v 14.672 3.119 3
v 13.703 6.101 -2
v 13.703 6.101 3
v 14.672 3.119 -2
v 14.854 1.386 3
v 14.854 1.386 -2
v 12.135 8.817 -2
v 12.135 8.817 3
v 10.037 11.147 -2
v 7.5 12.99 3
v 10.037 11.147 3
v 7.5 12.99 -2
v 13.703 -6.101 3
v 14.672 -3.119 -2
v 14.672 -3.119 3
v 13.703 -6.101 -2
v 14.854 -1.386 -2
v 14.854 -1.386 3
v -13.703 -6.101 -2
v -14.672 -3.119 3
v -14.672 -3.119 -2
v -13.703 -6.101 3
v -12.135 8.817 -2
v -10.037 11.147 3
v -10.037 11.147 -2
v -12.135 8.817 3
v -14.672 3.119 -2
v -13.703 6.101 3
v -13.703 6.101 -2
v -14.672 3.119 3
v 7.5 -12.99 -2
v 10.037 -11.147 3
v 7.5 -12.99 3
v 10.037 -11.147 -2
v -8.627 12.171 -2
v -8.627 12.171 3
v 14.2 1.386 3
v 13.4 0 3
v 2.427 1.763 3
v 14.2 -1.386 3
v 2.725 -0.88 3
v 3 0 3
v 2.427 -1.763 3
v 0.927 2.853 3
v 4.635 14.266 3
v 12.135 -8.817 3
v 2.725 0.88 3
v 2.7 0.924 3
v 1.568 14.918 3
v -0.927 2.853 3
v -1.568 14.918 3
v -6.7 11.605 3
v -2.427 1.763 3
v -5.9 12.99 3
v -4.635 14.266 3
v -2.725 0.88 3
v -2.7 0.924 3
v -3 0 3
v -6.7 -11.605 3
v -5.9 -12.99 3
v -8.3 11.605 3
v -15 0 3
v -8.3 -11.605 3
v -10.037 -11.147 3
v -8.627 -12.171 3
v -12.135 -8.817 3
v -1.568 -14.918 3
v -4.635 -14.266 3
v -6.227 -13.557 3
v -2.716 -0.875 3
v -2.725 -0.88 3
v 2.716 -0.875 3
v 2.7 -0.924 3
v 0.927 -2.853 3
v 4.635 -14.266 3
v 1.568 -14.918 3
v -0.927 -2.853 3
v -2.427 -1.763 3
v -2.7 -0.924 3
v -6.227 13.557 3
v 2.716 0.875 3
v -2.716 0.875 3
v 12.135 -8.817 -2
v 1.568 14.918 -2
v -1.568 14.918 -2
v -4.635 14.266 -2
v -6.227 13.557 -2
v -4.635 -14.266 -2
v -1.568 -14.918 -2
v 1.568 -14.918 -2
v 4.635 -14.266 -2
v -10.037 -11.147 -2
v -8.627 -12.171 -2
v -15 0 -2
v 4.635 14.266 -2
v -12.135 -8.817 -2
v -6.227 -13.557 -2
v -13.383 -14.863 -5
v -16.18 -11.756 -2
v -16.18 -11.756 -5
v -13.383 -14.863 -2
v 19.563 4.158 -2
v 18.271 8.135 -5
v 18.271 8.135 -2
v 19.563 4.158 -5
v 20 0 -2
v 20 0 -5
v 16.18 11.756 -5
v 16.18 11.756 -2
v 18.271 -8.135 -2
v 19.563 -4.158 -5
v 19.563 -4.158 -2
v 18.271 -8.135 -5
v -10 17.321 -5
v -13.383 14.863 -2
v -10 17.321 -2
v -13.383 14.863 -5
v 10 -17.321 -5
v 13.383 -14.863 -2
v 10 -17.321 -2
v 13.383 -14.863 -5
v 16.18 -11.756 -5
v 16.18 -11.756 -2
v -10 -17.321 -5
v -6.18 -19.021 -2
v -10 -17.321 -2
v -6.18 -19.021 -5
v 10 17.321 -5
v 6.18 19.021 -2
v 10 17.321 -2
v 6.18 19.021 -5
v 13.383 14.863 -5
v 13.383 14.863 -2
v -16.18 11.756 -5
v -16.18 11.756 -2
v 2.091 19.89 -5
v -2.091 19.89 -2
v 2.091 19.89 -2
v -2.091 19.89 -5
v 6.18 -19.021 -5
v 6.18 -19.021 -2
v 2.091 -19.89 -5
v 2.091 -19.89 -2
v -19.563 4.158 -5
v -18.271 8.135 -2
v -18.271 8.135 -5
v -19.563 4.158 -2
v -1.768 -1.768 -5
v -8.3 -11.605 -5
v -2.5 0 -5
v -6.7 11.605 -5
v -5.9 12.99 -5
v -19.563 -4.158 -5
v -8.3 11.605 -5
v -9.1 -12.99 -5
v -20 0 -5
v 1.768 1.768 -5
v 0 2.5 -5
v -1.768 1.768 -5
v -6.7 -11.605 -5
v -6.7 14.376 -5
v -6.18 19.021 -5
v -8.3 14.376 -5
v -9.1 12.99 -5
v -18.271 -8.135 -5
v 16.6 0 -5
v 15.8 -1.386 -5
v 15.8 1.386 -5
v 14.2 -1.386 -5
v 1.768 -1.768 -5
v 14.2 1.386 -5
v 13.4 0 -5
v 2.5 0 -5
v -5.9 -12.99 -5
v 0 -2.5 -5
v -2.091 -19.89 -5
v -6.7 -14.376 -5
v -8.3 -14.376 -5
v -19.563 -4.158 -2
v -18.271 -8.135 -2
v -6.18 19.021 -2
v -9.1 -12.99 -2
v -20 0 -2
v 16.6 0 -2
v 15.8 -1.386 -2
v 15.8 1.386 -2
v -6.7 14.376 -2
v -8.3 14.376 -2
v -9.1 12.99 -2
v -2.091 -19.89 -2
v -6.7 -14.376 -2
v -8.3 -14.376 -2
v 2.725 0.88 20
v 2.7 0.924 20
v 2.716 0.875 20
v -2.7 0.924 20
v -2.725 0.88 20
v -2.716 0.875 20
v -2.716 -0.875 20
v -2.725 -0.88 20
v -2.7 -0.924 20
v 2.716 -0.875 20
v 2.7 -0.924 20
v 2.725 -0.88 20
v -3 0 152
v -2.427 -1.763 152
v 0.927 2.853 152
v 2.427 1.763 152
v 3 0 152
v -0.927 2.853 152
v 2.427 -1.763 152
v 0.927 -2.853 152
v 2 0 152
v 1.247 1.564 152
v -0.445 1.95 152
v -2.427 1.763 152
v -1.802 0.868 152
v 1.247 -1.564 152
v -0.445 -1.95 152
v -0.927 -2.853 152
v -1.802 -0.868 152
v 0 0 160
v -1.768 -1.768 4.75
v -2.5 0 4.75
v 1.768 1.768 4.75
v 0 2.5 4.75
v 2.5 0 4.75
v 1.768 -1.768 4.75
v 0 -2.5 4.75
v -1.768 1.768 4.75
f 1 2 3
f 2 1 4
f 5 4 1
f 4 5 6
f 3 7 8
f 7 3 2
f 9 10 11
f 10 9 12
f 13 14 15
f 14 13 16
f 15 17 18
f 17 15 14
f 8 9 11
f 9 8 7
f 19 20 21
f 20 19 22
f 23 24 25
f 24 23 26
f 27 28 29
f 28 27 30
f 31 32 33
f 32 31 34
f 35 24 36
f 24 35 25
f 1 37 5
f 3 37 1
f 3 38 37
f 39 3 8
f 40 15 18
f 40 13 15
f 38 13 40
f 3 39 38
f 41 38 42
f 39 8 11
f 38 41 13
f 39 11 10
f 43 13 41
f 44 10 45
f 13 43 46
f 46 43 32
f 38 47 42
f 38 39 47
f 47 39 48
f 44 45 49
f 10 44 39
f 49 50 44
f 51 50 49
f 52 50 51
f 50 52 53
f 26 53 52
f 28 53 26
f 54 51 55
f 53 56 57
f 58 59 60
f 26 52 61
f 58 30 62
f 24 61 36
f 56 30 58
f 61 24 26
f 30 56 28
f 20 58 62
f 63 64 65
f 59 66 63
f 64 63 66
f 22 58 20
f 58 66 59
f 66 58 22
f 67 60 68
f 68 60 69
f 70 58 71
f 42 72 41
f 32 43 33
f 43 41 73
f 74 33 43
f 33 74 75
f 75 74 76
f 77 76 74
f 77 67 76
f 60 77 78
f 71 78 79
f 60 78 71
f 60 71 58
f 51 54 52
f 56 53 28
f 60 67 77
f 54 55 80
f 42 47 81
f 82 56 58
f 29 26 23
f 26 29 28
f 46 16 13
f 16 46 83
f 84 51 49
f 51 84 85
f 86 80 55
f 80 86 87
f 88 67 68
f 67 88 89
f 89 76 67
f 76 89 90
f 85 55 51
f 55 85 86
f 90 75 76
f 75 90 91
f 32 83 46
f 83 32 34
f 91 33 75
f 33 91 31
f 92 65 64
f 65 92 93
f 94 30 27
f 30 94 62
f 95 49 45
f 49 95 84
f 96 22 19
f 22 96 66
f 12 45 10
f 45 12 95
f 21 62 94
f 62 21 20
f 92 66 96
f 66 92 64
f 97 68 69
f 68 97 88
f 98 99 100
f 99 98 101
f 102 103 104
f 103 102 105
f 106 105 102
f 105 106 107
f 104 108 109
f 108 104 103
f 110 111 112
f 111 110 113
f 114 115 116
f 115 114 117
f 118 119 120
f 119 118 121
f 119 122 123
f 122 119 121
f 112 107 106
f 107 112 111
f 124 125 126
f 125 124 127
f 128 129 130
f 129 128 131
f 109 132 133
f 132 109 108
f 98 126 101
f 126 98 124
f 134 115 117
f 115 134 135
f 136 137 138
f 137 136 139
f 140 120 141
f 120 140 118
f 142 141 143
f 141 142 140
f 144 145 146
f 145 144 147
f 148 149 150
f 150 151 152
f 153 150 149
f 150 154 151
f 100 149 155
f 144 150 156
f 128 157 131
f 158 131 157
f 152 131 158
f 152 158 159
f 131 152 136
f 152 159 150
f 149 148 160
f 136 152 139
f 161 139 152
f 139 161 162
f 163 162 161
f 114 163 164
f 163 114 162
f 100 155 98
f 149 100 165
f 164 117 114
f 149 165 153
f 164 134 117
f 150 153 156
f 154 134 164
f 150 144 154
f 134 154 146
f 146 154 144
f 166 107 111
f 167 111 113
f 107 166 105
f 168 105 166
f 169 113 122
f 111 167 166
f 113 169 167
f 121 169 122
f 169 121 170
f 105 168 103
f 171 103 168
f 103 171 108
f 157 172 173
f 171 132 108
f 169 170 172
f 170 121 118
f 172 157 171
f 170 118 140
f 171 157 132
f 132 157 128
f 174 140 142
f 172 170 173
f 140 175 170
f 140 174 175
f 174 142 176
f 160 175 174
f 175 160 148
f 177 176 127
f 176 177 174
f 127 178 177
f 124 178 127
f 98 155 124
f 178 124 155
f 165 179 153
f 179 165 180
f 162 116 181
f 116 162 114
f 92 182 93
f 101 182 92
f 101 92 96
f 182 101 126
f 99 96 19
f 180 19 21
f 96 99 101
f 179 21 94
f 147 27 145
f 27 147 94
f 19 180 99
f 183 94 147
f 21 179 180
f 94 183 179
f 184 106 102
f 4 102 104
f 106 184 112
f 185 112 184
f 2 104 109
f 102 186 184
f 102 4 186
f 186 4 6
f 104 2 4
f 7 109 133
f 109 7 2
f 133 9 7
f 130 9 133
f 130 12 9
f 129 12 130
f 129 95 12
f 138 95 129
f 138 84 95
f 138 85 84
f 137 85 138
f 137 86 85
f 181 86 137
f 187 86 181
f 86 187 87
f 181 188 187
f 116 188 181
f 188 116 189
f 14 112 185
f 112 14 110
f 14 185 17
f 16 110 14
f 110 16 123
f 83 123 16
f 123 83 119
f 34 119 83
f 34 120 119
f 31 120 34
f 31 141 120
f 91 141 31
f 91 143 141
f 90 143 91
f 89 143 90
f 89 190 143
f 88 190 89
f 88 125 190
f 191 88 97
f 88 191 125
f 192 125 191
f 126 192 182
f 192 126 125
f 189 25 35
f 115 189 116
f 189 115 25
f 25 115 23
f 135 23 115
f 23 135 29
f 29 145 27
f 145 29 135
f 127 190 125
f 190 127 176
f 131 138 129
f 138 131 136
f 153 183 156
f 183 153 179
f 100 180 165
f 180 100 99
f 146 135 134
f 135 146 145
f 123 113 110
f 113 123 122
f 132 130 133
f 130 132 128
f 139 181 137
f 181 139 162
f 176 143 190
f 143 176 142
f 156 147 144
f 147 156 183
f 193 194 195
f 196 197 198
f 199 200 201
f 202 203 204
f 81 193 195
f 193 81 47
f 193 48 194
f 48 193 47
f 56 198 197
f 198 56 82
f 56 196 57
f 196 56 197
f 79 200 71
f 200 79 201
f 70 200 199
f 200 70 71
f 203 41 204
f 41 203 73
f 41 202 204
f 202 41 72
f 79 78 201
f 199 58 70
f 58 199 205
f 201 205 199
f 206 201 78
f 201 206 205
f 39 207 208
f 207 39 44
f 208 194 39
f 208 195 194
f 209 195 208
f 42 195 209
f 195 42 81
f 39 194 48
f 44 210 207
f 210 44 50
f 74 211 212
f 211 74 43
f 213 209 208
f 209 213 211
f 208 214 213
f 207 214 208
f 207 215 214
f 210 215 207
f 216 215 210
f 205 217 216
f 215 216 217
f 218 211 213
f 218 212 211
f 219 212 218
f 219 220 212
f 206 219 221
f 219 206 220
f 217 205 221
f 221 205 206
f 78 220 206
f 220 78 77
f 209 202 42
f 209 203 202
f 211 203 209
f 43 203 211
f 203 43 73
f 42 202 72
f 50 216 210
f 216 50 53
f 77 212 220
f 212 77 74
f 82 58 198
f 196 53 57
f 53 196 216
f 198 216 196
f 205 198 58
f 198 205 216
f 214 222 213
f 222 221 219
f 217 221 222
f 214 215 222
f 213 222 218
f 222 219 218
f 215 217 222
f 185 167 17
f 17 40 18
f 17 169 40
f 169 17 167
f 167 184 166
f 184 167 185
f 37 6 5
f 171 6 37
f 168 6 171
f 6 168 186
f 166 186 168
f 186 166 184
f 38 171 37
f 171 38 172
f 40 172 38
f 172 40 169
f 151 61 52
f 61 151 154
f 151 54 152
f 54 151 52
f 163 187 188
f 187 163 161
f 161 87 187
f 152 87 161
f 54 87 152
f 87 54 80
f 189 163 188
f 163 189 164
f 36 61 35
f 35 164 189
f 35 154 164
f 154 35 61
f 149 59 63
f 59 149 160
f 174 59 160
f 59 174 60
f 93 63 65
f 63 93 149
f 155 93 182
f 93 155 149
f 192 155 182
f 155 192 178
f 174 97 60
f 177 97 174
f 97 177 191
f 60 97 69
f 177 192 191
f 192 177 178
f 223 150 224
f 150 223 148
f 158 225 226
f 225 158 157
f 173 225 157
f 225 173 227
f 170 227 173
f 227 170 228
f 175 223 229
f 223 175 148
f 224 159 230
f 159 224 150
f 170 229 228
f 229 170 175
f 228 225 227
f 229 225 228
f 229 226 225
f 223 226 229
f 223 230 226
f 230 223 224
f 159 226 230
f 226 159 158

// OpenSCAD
// Parameters
mast_height = 150; //[75:300:1]
mast_diameter = 6; //[3:12:0.5]
base_diameter = 30; //[15:60:1]
base_thickness = 6; //[3:12:0.5]
flange_diameter = 40; //[20:80:1]
flange_thickness = 3; //[1.5:8:0.5]
hole_count = 3; //[2:8:1]
hole_diameter = 3.2; //[2:6:0.1]
hole_circle_diameter = 30; //[15:70:1]
top_tip_height = 8; //[0:20:0.5]
top_tip_diameter = 4; //[2:10:0.5]
cable_exit_diameter = 5; //[2:12:0.5]
rib_count = 12; //[0:24:1]
rib_radial_thickness = 0.8; //[0.3:2:0.1]
rib_tangential_width = 1.2; //[0.5:3:0.1]
rib_height = 18; //[5:40:1]
overlap = 1; //[0.5:2:0.1]

// Base cylinder
module base_cyl() {
  color("Silver")
  translate([0, 0, 0])
  cylinder(r=base_diameter/2, h=base_thickness, center=true);
}

// Flange cylinder
module flange_cyl() {
  color("Silver")
  translate([0, 0, -(base_thickness/2 + flange_thickness/2 - overlap)])
  cylinder(r=flange_diameter/2, h=flange_thickness, center=true);
}

// Mast cylinder
module mast_cyl() {
  color("DimGray")
  translate([0, 0, base_thickness/2 + mast_height/2 - overlap])
  cylinder(r=mast_diameter/2, h=mast_height, center=true);
}

// Top tip cone
module top_tip_cone() {
  color("DimGray")
  translate([0, 0, base_thickness/2 + mast_height - overlap + top_tip_height/2])
  cylinder(r1=top_tip_diameter/2, r2=0, h=top_tip_height, center=true);
}

// Mounting holes
module mount_hole(angle) {
  translate([hole_circle_diameter/2 * cos(angle), hole_circle_diameter/2 * sin(angle), -(base_thickness/2 + flange_thickness/2 - overlap)/2])
  cylinder(r=hole_diameter/2, h=base_thickness + flange_thickness + overlap*4, center=true);
}

// Cable exit hole
module cable_exit_hole() {
  translate([0, 0, -(base_thickness/2 + flange_thickness/2 - overlap)/2])
  cylinder(r=cable_exit_diameter/2, h=base_thickness + flange_thickness + overlap*4, center=true);
}

// Rib
module rib(angle) {
  translate([(mast_diameter/2 + rib_radial_thickness/2 - overlap) * cos(angle), (mast_diameter/2 + rib_radial_thickness/2 - overlap) * sin(angle), base_thickness/2 + rib_height/2 - overlap])
  rotate([0, 0, angle])
  cube([rib_radial_thickness, rib_tangential_width, rib_height], center=true);
}

// Assemble antenna
module antenna() {
  difference() {
    union() {
      union() {
        base_cyl();
        flange_cyl();
      }
      union() {
        mast_cyl();
        for (i = [0:30:330]) {
          rib(i);
        }
      }
      if (top_tip_height > 0) {
        top_tip_cone();
      }
    }
    union() {
      for (i = [0, 120, 240]) {
        mount_hole(i);
      }
      cable_exit_hole();
    }
  }
}

// Final output
antenna();
